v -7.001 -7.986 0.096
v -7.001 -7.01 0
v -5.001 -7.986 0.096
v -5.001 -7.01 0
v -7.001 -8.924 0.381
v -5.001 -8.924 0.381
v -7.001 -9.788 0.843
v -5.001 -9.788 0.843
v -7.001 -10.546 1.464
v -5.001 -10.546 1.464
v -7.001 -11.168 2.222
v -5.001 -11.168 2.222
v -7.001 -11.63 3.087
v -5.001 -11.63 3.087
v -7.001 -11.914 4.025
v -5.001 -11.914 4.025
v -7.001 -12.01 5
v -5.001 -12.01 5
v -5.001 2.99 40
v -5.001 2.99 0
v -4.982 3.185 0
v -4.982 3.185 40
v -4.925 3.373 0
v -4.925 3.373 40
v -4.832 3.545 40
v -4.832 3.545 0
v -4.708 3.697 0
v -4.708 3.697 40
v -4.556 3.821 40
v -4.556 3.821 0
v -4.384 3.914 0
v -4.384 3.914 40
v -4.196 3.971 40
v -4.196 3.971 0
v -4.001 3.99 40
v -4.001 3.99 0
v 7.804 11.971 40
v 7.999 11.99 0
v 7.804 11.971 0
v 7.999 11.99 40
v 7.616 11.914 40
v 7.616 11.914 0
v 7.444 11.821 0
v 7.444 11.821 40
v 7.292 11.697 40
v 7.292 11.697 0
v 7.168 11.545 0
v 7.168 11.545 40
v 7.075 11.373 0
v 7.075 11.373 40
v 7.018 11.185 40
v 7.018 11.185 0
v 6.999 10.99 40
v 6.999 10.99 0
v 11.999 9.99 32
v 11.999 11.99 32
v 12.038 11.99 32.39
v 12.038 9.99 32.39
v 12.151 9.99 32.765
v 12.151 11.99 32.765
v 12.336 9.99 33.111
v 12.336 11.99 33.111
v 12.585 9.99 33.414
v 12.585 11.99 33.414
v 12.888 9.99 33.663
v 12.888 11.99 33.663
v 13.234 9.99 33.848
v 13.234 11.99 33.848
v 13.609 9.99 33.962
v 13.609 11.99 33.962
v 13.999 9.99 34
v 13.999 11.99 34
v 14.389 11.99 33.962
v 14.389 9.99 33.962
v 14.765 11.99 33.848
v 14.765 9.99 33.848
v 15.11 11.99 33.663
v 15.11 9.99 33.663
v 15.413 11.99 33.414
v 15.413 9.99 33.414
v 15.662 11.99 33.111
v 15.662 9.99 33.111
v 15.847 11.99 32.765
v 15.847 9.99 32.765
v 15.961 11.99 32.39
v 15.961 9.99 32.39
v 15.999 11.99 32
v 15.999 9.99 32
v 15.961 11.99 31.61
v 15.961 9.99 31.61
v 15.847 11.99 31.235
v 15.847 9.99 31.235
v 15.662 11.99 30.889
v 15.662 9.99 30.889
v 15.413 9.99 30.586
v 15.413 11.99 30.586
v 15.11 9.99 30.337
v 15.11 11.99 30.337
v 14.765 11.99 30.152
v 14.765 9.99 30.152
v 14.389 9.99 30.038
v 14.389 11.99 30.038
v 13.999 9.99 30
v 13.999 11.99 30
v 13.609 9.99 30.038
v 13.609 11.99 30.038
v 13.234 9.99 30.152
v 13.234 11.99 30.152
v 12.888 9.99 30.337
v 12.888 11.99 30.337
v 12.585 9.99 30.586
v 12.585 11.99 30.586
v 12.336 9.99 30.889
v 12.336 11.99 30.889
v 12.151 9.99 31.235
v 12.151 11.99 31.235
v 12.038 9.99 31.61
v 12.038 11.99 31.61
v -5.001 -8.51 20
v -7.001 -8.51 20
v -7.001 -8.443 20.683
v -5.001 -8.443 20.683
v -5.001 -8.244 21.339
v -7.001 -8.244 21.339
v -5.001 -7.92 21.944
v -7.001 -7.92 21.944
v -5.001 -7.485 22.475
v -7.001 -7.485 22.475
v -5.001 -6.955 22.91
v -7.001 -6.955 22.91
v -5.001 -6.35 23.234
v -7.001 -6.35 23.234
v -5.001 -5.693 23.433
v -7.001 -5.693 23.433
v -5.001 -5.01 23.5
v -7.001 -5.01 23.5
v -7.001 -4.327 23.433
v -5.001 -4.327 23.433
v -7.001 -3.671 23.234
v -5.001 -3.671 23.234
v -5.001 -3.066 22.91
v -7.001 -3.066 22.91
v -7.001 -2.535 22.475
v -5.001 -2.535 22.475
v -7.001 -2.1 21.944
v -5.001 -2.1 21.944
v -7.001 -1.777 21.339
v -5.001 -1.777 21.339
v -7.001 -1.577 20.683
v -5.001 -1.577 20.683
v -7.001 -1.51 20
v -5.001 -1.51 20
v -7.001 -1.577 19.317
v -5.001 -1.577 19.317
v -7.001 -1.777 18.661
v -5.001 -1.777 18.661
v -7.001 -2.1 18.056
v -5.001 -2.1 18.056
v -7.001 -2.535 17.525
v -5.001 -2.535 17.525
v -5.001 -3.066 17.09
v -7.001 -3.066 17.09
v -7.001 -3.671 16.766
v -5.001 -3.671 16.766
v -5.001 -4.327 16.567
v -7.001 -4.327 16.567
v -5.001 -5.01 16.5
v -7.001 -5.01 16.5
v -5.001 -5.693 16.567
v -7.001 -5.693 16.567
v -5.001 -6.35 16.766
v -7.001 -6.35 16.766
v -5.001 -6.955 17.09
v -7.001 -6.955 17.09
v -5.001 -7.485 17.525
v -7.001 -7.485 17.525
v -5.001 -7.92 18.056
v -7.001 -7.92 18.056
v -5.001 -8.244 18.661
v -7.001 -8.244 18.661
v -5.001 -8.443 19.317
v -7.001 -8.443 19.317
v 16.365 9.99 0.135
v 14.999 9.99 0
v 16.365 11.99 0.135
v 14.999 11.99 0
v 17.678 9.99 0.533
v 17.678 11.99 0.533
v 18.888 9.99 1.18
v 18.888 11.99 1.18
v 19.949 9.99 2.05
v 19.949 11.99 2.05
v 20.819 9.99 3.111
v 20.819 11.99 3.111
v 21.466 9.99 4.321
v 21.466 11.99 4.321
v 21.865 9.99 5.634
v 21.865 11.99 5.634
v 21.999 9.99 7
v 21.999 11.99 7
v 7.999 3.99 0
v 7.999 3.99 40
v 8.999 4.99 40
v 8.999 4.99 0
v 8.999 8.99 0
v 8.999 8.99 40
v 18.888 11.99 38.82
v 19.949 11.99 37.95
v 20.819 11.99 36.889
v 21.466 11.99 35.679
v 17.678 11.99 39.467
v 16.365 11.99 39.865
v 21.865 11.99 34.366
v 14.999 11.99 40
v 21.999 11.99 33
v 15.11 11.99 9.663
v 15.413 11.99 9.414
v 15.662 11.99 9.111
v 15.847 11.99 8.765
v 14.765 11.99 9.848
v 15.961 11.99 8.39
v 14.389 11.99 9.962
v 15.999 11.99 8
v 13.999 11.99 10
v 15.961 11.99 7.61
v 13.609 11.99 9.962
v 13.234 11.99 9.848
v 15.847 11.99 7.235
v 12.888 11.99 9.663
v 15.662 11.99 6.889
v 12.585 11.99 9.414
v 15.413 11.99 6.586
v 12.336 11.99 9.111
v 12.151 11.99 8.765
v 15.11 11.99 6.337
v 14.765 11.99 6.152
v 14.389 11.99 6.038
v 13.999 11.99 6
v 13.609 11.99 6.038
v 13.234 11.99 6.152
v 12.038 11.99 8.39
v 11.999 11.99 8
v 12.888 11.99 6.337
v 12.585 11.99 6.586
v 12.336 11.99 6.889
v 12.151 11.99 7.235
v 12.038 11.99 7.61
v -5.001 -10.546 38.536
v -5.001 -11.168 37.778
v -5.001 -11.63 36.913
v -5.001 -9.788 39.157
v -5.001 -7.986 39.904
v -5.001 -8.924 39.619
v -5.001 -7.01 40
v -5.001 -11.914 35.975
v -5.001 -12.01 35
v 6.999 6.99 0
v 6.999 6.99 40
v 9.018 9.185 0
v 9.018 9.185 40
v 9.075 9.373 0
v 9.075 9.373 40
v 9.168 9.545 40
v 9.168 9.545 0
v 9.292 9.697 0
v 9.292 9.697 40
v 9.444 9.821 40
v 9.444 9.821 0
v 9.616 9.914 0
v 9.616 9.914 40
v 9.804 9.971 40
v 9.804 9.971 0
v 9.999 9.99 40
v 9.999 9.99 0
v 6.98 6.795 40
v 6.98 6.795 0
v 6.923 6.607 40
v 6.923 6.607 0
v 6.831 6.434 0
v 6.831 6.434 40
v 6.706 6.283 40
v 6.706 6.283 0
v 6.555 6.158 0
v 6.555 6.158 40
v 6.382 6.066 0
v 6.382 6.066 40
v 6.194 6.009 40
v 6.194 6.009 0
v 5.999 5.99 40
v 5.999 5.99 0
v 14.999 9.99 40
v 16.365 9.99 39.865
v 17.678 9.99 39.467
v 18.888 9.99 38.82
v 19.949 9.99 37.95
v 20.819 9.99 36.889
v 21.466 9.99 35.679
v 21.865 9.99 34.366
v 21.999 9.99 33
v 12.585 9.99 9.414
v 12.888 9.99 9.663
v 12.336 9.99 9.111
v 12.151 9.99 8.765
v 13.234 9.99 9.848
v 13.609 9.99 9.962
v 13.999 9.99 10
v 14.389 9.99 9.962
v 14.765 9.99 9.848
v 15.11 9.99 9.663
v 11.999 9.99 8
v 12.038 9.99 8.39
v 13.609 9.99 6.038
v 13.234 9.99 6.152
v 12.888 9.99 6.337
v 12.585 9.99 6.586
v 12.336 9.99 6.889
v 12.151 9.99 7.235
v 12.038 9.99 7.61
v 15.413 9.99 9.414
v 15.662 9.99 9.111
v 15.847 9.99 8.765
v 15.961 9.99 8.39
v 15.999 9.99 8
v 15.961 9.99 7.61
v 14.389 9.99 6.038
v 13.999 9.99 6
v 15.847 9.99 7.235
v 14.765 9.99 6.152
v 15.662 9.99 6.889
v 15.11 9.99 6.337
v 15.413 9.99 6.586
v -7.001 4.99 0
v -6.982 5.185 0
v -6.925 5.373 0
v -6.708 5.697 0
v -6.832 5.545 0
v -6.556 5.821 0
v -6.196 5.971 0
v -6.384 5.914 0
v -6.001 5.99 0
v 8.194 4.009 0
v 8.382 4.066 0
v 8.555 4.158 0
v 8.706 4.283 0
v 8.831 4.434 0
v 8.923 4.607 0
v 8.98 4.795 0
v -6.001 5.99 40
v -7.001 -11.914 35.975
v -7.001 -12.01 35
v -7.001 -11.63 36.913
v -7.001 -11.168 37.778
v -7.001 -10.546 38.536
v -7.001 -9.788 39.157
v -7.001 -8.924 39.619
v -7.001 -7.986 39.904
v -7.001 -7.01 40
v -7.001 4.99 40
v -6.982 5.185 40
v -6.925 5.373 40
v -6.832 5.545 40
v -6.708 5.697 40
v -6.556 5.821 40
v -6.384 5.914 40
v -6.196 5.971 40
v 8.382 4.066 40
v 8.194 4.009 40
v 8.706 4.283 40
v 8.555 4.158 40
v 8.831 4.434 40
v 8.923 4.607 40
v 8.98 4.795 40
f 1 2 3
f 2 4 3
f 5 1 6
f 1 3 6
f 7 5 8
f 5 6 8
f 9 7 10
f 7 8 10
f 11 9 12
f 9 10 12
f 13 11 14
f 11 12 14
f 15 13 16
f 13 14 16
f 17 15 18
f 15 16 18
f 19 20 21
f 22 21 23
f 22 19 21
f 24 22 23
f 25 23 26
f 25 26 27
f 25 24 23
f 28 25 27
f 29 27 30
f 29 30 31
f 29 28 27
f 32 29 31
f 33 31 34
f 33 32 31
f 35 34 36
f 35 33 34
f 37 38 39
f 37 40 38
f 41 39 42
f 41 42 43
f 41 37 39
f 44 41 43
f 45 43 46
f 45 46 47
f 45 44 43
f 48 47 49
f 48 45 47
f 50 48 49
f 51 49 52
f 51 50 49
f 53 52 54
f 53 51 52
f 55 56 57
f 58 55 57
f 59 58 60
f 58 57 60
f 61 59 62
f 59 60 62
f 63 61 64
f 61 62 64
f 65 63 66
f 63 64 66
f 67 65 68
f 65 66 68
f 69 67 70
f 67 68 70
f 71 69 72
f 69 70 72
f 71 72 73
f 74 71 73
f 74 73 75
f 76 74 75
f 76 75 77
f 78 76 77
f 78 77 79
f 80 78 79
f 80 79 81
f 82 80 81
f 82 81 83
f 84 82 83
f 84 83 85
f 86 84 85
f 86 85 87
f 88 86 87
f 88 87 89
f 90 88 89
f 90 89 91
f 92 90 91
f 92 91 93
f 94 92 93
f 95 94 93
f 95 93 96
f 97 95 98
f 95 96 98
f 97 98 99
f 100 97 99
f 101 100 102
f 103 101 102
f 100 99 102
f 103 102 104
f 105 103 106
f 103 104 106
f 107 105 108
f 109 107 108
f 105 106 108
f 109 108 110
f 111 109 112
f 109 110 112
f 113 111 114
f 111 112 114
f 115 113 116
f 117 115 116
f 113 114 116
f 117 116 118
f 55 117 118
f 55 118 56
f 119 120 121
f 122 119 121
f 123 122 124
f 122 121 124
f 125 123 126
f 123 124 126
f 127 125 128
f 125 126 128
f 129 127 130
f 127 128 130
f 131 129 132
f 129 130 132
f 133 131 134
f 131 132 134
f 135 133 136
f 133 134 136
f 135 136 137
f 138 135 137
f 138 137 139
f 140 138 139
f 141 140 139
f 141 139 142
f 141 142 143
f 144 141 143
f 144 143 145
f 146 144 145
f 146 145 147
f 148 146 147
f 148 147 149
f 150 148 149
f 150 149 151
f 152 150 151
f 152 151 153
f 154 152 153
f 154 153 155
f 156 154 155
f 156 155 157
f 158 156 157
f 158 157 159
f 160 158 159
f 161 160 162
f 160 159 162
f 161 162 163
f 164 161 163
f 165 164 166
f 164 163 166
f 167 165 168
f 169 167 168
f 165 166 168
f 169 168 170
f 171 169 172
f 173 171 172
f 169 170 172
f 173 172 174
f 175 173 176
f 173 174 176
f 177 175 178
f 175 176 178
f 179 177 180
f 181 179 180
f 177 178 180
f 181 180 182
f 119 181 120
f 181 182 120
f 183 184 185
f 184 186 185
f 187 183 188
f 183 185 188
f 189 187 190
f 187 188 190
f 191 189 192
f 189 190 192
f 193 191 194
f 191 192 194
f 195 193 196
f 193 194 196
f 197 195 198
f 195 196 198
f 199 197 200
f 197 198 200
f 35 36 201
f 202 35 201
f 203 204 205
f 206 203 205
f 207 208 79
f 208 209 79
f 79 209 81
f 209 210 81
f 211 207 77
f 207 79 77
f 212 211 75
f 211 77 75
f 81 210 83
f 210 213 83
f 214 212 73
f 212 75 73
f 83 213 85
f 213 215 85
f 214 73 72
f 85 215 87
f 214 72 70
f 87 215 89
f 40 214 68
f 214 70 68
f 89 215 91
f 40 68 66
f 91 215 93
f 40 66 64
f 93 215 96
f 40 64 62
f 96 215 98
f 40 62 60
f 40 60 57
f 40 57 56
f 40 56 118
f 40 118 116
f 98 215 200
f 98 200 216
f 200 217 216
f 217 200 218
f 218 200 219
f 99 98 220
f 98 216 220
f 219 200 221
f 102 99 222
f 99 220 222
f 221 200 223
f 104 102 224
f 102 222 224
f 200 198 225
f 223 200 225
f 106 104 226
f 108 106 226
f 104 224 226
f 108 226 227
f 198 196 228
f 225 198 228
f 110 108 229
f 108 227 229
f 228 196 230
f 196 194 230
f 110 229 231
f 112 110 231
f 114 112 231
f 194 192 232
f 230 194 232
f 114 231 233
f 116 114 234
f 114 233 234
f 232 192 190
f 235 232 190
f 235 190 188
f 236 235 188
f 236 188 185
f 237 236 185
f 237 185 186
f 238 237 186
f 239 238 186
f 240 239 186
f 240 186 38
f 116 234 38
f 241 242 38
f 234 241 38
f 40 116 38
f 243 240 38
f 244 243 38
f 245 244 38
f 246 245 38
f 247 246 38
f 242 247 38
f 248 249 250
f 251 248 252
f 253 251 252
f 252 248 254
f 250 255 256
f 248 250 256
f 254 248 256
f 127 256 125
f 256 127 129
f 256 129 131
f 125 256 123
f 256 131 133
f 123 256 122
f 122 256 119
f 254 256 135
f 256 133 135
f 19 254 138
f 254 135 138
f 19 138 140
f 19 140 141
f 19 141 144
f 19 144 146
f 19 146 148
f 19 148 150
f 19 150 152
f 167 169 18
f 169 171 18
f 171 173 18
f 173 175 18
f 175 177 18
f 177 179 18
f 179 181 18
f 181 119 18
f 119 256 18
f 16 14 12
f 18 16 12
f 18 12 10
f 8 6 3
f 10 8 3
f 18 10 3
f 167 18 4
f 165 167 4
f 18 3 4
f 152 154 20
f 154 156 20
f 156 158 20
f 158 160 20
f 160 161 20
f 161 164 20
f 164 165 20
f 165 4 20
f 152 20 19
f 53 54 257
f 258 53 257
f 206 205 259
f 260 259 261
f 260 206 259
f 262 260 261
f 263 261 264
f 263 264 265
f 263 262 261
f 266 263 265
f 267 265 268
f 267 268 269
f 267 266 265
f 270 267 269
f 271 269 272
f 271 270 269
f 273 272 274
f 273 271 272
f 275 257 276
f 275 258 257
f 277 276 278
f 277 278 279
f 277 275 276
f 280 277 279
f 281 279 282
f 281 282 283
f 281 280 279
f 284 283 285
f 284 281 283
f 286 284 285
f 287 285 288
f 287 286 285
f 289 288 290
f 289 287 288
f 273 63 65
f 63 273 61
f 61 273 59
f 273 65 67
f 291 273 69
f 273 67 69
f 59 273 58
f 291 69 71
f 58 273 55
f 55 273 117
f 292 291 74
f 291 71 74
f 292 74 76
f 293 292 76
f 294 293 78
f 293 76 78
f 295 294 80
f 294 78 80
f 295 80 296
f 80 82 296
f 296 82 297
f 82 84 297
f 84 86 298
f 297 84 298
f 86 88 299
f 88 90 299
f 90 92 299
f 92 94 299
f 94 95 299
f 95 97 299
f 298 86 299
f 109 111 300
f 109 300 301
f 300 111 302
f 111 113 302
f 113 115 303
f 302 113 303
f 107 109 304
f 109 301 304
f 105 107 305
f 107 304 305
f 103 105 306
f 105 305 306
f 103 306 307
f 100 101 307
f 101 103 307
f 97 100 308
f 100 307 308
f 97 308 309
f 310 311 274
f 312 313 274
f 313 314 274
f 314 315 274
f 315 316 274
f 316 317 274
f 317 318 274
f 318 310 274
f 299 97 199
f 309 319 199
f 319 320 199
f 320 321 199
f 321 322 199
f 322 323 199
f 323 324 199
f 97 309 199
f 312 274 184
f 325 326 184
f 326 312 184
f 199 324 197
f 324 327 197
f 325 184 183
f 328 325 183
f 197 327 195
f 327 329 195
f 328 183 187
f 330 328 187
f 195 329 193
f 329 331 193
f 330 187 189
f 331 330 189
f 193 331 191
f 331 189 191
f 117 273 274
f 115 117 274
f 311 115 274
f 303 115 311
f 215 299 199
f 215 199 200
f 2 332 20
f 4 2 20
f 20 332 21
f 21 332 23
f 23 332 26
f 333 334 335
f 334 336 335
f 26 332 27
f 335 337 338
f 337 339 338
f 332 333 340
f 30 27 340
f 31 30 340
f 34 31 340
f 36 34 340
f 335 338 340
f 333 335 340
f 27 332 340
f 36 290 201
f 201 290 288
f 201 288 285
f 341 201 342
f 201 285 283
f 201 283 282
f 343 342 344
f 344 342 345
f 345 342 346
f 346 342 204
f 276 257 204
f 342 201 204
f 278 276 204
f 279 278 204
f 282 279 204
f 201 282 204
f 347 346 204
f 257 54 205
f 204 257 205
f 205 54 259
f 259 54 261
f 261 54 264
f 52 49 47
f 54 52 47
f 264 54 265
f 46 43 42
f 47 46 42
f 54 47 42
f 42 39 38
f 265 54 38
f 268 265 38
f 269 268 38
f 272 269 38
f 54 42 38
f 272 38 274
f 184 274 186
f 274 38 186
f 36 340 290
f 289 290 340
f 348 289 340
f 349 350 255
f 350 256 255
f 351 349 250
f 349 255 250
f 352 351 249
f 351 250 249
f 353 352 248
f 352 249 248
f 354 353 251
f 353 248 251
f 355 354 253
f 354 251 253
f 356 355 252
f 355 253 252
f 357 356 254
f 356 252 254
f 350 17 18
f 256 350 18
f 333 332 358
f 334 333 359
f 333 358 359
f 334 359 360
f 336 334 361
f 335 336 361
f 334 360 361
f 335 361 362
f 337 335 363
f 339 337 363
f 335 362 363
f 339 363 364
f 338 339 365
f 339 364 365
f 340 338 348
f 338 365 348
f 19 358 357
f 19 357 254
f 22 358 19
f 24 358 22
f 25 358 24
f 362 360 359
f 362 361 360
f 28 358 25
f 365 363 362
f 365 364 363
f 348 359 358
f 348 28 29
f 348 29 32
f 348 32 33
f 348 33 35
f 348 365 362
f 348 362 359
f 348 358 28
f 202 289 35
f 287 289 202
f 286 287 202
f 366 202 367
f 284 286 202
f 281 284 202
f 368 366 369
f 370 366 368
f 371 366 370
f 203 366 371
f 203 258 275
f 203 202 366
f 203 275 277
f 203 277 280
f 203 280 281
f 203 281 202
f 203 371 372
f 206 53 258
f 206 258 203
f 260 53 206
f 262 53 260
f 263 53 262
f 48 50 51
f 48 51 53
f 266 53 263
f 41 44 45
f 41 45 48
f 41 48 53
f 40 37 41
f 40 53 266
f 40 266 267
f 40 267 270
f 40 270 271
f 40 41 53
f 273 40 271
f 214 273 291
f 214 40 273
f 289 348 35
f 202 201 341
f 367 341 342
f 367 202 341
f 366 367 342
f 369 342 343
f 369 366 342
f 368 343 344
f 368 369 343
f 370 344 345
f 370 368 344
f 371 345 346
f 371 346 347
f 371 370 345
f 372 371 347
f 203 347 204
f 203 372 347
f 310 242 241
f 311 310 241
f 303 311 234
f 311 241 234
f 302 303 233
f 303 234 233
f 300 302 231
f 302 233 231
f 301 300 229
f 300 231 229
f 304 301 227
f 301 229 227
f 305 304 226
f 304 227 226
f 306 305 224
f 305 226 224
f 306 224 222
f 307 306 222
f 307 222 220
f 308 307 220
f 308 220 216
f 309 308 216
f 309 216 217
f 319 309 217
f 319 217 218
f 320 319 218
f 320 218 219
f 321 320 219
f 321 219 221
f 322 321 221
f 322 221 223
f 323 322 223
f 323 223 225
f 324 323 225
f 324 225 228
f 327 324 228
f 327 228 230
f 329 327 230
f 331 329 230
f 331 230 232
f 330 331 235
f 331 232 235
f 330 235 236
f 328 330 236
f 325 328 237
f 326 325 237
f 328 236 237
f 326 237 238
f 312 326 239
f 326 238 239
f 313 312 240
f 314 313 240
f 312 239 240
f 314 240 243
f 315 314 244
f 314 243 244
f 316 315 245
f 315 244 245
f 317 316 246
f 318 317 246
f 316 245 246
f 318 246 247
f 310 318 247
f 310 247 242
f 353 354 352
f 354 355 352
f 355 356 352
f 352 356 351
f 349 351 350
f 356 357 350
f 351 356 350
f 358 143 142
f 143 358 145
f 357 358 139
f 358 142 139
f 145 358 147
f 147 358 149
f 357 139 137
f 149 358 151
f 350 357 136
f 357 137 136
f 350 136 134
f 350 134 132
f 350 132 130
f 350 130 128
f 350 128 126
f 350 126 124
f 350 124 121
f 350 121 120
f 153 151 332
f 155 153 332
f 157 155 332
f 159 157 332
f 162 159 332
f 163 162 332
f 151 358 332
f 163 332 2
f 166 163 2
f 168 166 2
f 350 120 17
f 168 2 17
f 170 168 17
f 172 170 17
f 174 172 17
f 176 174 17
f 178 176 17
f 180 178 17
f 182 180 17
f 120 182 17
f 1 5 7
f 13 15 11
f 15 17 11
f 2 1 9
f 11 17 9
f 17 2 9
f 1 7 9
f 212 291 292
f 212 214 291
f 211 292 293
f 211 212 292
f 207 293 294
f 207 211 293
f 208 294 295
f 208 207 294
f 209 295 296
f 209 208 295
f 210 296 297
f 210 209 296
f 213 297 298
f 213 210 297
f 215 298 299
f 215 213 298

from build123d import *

# Parameters (mm, degrees)
F1_DEPTH = 40
F2_R     = 1
F3_R     = 5
F4_R     = 3.5
F5_DEPTH = 25
F6_R     = 2
F7_DEPTH = 25
F8_R     = 7


with BuildPart() as f1:
    # F0 (on Top) → F1 (new body)
    with BuildSketch(Plane.XY):
        Polygon((-5.000828, 5.989827), (-7.000828, 5.989827), (-7.000828, -12.010173), (-5.000828, -12.010173), (-5.000828, 3.989827), (6.999172, 3.989827), (8.999172, 3.989827), (8.999172, 9.989827), (21.999172, 9.989827), (21.999172, 11.989827), (8.999172, 11.989827), (6.999172, 11.989827), (6.999172, 9.989827), (6.999172, 5.989827), align=None)
    extrude(amount=F1_DEPTH)

    # F2
    f2_edges = [f1.edges().sort_by_distance(p)[0] for p in [
        (-7.000828, 5.989827, 20),
        (6.999172, 11.989827, 20),
        (-5.000828, 3.989827, 20),
        (8.999172, 9.989827, 20),
        (8.999172, 3.989827, 20),
        (6.999172, 5.989827, 20),
    ]]
    fillet(f2_edges, radius=F2_R)

    # F3
    f3_edges = [f1.edges().sort_by_distance(p)[0] for p in [
        (-6.000828, -12.010173, 0),
        (-6.000828, -12.010173, 40),
    ]]
    fillet(f3_edges, radius=F3_R)

    # F4 (on face) → F5 (cut)
    with BuildSketch(Plane(origin=(-7.000828, 0, 0), x_dir=(0, -1, 0), z_dir=(-1, 0, 0))):
        with Locations((5.010173, 20)):
            Circle(F4_R)
    extrude(amount=-F5_DEPTH, mode=Mode.SUBTRACT)

    # F6 (on face) → F7 (cut)
    with BuildSketch(Plane(origin=(0, 11.989827, 0), x_dir=(-1, 0, 0), z_dir=(0, 1, 0))):
        with Locations((-13.999172, 8)):
            Circle(F6_R)
        with Locations((-13.999172, 32)):
            Circle(F6_R)
    extrude(amount=-F7_DEPTH, mode=Mode.SUBTRACT)

    # F8
    f8_edges = [f1.edges().sort_by_distance(p)[0] for p in [
        (21.999172, 10.989827, 0),
        (21.999172, 10.989827, 40),
    ]]
    fillet(f8_edges, radius=F8_R)


solid = f1.part
